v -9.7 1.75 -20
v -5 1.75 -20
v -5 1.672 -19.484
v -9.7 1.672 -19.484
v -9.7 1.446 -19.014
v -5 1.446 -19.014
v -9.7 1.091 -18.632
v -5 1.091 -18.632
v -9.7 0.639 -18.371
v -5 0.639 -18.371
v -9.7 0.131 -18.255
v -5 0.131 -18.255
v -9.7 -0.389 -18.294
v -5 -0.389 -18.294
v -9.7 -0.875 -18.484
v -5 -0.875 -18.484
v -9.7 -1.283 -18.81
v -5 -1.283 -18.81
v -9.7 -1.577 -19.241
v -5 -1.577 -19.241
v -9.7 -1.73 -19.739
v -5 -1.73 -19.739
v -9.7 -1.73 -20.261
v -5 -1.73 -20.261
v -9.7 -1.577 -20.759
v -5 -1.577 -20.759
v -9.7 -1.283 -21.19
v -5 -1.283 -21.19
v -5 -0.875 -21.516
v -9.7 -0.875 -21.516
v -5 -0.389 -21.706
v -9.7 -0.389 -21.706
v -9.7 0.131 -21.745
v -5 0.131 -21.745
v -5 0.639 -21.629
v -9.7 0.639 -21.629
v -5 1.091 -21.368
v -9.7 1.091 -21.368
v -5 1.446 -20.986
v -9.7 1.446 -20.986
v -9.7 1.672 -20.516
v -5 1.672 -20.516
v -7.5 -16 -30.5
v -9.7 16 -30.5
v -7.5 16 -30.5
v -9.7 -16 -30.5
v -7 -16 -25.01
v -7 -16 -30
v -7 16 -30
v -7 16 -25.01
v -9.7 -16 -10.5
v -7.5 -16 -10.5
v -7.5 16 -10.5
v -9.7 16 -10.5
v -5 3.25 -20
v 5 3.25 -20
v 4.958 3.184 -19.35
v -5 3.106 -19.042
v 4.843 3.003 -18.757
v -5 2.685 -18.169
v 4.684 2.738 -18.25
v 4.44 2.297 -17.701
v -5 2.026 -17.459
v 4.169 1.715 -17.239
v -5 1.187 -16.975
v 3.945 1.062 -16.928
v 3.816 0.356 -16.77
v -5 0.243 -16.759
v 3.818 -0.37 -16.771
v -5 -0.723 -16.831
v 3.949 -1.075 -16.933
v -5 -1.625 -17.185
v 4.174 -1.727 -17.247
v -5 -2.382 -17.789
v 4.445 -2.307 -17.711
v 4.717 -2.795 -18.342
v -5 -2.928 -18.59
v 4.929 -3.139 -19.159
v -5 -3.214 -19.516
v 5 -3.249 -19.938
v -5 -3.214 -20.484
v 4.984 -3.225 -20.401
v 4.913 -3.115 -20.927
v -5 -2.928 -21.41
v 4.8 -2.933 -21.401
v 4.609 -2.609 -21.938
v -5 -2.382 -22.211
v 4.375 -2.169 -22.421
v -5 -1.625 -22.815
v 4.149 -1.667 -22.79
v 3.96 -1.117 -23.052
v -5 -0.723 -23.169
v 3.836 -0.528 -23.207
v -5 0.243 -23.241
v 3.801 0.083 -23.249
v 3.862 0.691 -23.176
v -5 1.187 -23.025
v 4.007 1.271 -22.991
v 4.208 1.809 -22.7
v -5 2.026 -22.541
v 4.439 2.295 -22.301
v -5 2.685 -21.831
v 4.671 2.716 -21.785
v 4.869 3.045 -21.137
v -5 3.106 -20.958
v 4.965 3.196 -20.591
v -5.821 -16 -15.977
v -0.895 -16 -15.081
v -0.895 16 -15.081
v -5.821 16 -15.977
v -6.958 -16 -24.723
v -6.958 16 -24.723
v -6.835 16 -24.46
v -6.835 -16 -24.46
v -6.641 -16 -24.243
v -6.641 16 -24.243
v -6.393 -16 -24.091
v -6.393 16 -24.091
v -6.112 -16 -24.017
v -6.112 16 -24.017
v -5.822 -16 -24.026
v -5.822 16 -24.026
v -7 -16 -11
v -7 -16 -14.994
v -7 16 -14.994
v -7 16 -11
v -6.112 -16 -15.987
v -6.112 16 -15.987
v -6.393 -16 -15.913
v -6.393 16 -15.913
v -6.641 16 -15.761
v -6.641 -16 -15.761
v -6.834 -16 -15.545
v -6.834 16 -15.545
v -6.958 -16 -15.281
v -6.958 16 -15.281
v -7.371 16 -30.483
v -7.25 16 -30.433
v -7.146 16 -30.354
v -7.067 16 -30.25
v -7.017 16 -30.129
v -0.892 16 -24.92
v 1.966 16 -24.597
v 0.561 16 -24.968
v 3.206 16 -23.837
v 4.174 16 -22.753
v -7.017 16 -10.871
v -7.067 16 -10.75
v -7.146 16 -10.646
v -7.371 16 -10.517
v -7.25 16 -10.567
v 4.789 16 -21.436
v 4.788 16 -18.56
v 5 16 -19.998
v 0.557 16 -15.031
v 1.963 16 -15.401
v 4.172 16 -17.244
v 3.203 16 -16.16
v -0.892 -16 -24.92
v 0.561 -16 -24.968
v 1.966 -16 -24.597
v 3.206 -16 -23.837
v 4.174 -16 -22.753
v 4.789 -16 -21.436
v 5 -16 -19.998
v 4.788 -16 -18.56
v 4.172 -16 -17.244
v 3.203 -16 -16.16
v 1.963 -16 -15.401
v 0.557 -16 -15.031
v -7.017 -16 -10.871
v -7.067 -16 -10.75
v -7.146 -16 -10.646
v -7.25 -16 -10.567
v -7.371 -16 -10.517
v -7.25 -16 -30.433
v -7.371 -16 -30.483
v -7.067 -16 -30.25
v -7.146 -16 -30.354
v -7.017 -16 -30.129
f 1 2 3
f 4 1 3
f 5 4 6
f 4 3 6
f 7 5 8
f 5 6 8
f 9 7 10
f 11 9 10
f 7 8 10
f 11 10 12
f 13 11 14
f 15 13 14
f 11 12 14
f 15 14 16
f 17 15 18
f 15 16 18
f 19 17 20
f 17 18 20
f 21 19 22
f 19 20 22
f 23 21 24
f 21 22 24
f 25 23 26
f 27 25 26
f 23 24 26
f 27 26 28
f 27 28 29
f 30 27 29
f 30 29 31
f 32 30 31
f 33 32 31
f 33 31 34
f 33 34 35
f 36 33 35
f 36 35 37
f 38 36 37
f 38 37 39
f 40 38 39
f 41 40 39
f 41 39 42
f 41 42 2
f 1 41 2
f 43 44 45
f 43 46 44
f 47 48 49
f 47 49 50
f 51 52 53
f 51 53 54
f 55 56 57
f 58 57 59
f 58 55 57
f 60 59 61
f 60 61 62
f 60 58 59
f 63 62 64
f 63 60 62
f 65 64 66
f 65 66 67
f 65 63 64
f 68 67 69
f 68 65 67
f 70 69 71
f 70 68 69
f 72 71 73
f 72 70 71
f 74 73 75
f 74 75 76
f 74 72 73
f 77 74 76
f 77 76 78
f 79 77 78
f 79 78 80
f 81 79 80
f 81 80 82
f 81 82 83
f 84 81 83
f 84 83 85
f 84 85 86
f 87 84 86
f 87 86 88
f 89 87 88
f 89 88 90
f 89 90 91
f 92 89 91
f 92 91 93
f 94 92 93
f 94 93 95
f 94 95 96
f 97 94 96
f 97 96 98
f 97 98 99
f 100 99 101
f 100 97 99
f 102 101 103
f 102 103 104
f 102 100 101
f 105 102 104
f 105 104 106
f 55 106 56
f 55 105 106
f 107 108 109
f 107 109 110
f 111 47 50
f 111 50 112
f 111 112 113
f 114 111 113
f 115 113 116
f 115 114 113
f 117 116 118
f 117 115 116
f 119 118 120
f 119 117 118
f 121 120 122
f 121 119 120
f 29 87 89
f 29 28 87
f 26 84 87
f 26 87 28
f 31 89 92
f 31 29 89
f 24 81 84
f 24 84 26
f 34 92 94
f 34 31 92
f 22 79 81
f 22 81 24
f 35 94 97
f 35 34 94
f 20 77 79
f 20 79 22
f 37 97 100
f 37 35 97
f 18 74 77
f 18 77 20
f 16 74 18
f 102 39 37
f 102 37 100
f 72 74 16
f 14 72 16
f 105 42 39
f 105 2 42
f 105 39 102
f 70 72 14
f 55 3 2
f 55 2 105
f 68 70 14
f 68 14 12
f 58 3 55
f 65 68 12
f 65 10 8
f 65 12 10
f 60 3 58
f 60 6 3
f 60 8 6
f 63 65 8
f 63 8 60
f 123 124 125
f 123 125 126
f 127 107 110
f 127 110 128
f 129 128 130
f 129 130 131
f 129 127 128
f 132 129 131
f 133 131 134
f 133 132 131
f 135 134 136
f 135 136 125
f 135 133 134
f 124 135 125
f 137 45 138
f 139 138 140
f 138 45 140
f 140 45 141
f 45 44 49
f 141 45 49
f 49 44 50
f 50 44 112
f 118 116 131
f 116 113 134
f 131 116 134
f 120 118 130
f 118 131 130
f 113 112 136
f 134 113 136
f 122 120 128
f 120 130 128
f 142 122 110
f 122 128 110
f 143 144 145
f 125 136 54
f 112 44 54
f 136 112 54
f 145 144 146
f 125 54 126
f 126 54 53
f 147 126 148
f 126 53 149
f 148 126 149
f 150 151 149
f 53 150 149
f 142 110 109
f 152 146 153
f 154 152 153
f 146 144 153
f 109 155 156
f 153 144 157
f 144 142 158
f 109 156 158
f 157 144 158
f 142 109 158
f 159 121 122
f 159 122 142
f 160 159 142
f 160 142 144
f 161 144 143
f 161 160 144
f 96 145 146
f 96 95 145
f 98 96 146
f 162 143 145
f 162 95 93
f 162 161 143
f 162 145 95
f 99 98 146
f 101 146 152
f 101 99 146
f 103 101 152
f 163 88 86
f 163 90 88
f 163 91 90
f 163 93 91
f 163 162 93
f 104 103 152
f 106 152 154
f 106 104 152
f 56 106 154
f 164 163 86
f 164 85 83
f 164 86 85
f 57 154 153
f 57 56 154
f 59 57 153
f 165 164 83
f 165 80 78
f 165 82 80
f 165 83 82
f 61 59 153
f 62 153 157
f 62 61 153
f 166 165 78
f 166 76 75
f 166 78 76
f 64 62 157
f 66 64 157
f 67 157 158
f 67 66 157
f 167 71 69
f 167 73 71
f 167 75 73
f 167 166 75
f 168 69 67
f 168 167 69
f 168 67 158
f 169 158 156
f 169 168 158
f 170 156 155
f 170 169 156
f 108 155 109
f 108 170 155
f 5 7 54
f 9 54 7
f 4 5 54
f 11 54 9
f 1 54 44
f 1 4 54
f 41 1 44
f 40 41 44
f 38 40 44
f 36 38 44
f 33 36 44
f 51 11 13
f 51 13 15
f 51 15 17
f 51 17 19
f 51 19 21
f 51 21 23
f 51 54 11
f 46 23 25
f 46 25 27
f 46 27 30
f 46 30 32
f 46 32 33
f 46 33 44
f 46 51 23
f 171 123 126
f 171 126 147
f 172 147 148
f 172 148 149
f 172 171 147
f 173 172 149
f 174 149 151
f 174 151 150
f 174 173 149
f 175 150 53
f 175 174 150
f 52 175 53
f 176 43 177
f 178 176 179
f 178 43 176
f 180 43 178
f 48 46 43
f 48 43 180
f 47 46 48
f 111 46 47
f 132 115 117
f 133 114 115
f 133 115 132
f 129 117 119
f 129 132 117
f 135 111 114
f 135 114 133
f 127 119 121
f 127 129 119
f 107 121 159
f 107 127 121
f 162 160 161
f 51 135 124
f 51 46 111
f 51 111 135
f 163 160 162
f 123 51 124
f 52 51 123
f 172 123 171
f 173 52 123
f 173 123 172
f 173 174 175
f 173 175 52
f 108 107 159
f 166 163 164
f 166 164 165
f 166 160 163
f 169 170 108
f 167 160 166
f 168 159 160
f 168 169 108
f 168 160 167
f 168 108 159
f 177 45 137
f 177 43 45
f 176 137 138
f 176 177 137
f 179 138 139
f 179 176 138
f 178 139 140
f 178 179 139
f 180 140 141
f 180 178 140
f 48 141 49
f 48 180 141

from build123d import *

# Parameters (mm, degrees)
PAD102_DEPTH      = 16
SKETCH199_R       = 1.75
POCKET_DEPTH      = 9.701
POCKET_DEPTH_BACK = 5.001
SKETCH200_R       = 3.25
POCKET073_DEPTH   = 10.001


with BuildPart() as part:
    # Sketch198 → Pad102 (new body, symmetric)
    with BuildSketch(Plane.XZ):
        with BuildLine():
            ThreePointArc((-7.5, -30.5), (-7.146447, -30.353554), (-7, -30))
            Line((-7, -30), (-7, -25.010349))
            ThreePointArc((-7, -25.010349), (-6.640965, -24.242779), (-5.821673, -24.026377))
            Line((-5.821673, -24.026377), (-0.891634, -24.919857))
            ThreePointArc((-0.891634, -24.919857), (5, -19.998107), (-0.89536, -15.08082))
            Line((-0.89536, -15.08082), (-5.820928, -15.977343))
            ThreePointArc((-5.820928, -15.977343), (-6.640675, -15.76132), (-7, -14.993507))
            Line((-7, -14.993507), (-7, -11))
            ThreePointArc((-7, -11), (-7.146447, -10.646447), (-7.5, -10.5))
            Line((-7.5, -10.5), (-9.7, -10.5))
            Line((-9.7, -10.5), (-9.7, -30.5))
            Line((-9.7, -30.5), (-7.5, -30.5))
        make_face()
    extrude(amount=PAD102_DEPTH, both=True)

    # Sketch199 → Pocket (cut, two sides)
    with BuildSketch(Plane.YZ) as pocket_sk:
        with Locations((0, -20)):
            Circle(SKETCH199_R)
    extrude(amount=-POCKET_DEPTH, mode=Mode.SUBTRACT)
    extrude(pocket_sk.sketch, amount=POCKET_DEPTH_BACK, mode=Mode.SUBTRACT)

    # Sketch200 → Pocket073 (cut, through all)
    with BuildSketch(Plane.YZ.offset(-5)):
        with Locations((0, -20)):
            Circle(SKETCH200_R)
    extrude(amount=POCKET073_DEPTH, mode=Mode.SUBTRACT)


solid = part.part
